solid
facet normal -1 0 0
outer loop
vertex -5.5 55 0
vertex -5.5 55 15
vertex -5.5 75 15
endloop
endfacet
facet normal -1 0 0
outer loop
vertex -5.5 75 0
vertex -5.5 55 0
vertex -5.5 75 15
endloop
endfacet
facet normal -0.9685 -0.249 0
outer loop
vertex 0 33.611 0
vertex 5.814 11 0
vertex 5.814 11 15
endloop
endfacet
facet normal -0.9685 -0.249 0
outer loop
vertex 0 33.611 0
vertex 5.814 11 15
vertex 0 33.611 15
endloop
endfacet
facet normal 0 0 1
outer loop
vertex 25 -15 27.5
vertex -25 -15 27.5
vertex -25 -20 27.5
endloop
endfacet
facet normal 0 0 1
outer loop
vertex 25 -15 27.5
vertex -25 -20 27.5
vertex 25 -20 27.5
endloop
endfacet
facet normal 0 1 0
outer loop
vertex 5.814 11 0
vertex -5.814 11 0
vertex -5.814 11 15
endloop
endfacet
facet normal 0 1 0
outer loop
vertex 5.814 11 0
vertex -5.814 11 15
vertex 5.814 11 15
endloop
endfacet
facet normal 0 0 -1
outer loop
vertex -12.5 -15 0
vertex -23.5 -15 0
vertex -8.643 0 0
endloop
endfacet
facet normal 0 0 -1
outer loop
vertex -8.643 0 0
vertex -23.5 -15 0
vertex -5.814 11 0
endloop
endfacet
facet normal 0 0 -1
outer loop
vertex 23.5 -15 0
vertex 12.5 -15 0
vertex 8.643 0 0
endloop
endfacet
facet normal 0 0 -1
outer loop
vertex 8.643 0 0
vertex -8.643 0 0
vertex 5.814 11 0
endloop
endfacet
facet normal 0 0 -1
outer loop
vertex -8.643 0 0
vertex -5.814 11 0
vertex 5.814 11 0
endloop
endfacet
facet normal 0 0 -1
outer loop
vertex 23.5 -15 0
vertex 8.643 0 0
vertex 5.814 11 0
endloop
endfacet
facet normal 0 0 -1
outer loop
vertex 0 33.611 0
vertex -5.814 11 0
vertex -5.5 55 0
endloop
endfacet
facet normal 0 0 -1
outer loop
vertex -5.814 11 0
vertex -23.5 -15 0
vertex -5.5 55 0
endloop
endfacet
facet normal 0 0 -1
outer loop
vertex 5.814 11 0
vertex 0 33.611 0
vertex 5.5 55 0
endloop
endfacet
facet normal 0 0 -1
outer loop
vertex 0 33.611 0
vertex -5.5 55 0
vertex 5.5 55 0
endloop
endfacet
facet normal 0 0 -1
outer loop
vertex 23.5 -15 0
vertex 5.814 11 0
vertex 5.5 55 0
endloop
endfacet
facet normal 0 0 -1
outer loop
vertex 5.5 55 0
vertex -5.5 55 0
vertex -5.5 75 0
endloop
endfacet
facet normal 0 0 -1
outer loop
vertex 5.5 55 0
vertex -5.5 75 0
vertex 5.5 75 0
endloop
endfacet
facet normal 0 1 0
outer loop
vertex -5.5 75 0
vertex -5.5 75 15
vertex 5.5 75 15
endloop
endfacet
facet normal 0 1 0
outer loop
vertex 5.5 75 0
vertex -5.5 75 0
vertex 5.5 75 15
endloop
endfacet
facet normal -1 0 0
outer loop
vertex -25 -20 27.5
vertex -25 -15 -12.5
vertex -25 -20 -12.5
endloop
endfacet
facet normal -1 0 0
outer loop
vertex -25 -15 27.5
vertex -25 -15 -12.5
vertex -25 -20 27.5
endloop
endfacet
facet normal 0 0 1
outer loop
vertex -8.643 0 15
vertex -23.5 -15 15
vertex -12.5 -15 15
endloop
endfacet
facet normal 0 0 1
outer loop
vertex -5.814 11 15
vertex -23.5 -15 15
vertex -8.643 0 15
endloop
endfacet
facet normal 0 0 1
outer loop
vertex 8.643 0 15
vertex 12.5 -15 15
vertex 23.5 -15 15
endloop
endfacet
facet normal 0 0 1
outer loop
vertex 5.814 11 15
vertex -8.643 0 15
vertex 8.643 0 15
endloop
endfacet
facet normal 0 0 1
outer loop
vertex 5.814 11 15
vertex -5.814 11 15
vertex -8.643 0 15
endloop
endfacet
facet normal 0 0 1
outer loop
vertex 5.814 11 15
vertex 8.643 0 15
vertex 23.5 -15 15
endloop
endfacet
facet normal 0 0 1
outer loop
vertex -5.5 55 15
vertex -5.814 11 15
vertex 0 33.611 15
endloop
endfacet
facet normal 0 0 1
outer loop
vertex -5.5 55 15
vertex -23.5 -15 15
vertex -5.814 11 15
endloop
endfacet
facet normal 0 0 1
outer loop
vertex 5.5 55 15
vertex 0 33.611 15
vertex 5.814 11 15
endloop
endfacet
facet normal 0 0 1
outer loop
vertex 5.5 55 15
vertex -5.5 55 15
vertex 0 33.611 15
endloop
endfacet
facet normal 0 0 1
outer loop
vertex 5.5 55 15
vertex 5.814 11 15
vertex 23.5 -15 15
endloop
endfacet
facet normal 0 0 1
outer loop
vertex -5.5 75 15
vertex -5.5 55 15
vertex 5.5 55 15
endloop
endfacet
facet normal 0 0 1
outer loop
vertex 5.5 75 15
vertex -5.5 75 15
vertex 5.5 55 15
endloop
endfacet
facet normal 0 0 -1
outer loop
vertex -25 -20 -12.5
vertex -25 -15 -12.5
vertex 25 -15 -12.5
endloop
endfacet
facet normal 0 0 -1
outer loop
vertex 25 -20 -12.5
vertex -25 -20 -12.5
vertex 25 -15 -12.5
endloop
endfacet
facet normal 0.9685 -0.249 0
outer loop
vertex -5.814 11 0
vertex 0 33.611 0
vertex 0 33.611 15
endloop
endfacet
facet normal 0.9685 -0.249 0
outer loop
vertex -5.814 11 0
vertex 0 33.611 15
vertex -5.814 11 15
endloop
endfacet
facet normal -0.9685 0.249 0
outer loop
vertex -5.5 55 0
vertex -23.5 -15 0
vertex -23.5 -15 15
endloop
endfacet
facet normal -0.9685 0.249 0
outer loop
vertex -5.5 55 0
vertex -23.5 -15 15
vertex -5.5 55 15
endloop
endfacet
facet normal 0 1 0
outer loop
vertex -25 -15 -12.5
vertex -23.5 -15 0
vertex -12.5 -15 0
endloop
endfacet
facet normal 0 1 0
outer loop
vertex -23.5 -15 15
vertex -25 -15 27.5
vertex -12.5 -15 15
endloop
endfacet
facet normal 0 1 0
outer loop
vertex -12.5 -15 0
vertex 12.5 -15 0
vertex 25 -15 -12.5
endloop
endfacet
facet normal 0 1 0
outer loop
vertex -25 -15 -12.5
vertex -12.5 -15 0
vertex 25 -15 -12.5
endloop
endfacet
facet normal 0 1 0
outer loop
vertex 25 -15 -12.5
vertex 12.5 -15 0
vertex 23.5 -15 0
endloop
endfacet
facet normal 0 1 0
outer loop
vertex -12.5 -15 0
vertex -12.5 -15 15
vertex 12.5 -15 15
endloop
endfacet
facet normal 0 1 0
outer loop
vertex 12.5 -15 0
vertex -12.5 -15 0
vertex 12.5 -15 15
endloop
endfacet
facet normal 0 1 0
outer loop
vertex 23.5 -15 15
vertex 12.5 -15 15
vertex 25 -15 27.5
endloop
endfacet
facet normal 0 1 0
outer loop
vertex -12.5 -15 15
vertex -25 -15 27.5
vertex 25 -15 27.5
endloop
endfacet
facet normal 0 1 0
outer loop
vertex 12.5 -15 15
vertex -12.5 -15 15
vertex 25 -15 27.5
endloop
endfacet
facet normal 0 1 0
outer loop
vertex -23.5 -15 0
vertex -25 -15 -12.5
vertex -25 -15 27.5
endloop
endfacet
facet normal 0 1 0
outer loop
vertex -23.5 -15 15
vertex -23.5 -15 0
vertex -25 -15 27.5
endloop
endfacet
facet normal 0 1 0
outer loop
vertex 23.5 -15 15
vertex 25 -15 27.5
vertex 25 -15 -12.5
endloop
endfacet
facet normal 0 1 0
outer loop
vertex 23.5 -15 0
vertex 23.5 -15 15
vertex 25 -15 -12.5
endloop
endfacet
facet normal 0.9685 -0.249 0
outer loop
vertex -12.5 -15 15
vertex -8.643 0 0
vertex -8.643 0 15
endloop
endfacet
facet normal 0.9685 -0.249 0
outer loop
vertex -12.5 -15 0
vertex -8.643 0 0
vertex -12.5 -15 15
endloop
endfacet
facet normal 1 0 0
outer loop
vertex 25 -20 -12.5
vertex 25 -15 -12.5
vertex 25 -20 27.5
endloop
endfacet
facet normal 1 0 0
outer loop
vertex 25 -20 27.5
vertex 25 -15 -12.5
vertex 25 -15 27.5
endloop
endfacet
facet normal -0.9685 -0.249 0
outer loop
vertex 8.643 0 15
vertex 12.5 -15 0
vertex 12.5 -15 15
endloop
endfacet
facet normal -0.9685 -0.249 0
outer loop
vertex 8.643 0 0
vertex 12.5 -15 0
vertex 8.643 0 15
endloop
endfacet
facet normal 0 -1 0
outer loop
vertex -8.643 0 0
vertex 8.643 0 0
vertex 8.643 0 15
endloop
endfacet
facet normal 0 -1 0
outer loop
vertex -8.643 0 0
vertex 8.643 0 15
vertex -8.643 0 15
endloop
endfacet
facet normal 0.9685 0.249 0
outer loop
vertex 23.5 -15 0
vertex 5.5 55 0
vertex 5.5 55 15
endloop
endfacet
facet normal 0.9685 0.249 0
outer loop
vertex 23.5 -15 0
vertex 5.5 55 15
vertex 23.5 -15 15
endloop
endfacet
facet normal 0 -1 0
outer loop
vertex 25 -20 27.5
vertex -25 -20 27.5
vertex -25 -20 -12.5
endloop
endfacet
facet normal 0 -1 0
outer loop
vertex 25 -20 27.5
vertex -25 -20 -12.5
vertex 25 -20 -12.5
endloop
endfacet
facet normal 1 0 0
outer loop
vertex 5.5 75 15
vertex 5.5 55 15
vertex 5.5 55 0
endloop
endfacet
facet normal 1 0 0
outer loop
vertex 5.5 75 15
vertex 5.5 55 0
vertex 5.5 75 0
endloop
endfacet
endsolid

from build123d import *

# Parameters (mm, degrees)
AUFSATZ_LINEAR_AUSTRAGEN1_DEPTH = 15
SKIZZE2_W                       = 50
SKIZZE2_H                       = 40
AUFSATZ_LINEAR_AUSTRAGEN2_DEPTH = 5
SKIZZE3_W                       = 11
SKIZZE3_H                       = 20
AUFSATZ_LINEAR_AUSTRAGEN3_DEPTH = 15


with BuildPart() as part:
    # Skizze1 → Aufsatz-Linear austragen1 (new body)
    with BuildSketch(Plane.XY):
        Polygon((8.642857143, 0), (-8.642857143, 0), (-12.5, -15), (-23.5, -15), (-5.5, 55), (5.5, 55), (23.5, -15), (12.5, -15), align=None)
        Polygon((0, 33.611111111), (-5.814285714, 11), (5.814285714, 11), align=None, mode=Mode.SUBTRACT)
    extrude(amount=AUFSATZ_LINEAR_AUSTRAGEN1_DEPTH)

    # Skizze2 → Aufsatz-Linear austragen2 (add)
    with BuildSketch(Plane.XZ.offset(15)):
        with Locations((0, 7.5)):
            Rectangle(SKIZZE2_W, SKIZZE2_H)
    extrude(amount=AUFSATZ_LINEAR_AUSTRAGEN2_DEPTH)

    # Skizze3 → Aufsatz-Linear austragen3 (add)
    with BuildSketch(Plane.XY.offset(15)):
        with Locations((0, 65)):
            Rectangle(SKIZZE3_W, SKIZZE3_H)
    extrude(amount=-AUFSATZ_LINEAR_AUSTRAGEN3_DEPTH)


solid = part.part
